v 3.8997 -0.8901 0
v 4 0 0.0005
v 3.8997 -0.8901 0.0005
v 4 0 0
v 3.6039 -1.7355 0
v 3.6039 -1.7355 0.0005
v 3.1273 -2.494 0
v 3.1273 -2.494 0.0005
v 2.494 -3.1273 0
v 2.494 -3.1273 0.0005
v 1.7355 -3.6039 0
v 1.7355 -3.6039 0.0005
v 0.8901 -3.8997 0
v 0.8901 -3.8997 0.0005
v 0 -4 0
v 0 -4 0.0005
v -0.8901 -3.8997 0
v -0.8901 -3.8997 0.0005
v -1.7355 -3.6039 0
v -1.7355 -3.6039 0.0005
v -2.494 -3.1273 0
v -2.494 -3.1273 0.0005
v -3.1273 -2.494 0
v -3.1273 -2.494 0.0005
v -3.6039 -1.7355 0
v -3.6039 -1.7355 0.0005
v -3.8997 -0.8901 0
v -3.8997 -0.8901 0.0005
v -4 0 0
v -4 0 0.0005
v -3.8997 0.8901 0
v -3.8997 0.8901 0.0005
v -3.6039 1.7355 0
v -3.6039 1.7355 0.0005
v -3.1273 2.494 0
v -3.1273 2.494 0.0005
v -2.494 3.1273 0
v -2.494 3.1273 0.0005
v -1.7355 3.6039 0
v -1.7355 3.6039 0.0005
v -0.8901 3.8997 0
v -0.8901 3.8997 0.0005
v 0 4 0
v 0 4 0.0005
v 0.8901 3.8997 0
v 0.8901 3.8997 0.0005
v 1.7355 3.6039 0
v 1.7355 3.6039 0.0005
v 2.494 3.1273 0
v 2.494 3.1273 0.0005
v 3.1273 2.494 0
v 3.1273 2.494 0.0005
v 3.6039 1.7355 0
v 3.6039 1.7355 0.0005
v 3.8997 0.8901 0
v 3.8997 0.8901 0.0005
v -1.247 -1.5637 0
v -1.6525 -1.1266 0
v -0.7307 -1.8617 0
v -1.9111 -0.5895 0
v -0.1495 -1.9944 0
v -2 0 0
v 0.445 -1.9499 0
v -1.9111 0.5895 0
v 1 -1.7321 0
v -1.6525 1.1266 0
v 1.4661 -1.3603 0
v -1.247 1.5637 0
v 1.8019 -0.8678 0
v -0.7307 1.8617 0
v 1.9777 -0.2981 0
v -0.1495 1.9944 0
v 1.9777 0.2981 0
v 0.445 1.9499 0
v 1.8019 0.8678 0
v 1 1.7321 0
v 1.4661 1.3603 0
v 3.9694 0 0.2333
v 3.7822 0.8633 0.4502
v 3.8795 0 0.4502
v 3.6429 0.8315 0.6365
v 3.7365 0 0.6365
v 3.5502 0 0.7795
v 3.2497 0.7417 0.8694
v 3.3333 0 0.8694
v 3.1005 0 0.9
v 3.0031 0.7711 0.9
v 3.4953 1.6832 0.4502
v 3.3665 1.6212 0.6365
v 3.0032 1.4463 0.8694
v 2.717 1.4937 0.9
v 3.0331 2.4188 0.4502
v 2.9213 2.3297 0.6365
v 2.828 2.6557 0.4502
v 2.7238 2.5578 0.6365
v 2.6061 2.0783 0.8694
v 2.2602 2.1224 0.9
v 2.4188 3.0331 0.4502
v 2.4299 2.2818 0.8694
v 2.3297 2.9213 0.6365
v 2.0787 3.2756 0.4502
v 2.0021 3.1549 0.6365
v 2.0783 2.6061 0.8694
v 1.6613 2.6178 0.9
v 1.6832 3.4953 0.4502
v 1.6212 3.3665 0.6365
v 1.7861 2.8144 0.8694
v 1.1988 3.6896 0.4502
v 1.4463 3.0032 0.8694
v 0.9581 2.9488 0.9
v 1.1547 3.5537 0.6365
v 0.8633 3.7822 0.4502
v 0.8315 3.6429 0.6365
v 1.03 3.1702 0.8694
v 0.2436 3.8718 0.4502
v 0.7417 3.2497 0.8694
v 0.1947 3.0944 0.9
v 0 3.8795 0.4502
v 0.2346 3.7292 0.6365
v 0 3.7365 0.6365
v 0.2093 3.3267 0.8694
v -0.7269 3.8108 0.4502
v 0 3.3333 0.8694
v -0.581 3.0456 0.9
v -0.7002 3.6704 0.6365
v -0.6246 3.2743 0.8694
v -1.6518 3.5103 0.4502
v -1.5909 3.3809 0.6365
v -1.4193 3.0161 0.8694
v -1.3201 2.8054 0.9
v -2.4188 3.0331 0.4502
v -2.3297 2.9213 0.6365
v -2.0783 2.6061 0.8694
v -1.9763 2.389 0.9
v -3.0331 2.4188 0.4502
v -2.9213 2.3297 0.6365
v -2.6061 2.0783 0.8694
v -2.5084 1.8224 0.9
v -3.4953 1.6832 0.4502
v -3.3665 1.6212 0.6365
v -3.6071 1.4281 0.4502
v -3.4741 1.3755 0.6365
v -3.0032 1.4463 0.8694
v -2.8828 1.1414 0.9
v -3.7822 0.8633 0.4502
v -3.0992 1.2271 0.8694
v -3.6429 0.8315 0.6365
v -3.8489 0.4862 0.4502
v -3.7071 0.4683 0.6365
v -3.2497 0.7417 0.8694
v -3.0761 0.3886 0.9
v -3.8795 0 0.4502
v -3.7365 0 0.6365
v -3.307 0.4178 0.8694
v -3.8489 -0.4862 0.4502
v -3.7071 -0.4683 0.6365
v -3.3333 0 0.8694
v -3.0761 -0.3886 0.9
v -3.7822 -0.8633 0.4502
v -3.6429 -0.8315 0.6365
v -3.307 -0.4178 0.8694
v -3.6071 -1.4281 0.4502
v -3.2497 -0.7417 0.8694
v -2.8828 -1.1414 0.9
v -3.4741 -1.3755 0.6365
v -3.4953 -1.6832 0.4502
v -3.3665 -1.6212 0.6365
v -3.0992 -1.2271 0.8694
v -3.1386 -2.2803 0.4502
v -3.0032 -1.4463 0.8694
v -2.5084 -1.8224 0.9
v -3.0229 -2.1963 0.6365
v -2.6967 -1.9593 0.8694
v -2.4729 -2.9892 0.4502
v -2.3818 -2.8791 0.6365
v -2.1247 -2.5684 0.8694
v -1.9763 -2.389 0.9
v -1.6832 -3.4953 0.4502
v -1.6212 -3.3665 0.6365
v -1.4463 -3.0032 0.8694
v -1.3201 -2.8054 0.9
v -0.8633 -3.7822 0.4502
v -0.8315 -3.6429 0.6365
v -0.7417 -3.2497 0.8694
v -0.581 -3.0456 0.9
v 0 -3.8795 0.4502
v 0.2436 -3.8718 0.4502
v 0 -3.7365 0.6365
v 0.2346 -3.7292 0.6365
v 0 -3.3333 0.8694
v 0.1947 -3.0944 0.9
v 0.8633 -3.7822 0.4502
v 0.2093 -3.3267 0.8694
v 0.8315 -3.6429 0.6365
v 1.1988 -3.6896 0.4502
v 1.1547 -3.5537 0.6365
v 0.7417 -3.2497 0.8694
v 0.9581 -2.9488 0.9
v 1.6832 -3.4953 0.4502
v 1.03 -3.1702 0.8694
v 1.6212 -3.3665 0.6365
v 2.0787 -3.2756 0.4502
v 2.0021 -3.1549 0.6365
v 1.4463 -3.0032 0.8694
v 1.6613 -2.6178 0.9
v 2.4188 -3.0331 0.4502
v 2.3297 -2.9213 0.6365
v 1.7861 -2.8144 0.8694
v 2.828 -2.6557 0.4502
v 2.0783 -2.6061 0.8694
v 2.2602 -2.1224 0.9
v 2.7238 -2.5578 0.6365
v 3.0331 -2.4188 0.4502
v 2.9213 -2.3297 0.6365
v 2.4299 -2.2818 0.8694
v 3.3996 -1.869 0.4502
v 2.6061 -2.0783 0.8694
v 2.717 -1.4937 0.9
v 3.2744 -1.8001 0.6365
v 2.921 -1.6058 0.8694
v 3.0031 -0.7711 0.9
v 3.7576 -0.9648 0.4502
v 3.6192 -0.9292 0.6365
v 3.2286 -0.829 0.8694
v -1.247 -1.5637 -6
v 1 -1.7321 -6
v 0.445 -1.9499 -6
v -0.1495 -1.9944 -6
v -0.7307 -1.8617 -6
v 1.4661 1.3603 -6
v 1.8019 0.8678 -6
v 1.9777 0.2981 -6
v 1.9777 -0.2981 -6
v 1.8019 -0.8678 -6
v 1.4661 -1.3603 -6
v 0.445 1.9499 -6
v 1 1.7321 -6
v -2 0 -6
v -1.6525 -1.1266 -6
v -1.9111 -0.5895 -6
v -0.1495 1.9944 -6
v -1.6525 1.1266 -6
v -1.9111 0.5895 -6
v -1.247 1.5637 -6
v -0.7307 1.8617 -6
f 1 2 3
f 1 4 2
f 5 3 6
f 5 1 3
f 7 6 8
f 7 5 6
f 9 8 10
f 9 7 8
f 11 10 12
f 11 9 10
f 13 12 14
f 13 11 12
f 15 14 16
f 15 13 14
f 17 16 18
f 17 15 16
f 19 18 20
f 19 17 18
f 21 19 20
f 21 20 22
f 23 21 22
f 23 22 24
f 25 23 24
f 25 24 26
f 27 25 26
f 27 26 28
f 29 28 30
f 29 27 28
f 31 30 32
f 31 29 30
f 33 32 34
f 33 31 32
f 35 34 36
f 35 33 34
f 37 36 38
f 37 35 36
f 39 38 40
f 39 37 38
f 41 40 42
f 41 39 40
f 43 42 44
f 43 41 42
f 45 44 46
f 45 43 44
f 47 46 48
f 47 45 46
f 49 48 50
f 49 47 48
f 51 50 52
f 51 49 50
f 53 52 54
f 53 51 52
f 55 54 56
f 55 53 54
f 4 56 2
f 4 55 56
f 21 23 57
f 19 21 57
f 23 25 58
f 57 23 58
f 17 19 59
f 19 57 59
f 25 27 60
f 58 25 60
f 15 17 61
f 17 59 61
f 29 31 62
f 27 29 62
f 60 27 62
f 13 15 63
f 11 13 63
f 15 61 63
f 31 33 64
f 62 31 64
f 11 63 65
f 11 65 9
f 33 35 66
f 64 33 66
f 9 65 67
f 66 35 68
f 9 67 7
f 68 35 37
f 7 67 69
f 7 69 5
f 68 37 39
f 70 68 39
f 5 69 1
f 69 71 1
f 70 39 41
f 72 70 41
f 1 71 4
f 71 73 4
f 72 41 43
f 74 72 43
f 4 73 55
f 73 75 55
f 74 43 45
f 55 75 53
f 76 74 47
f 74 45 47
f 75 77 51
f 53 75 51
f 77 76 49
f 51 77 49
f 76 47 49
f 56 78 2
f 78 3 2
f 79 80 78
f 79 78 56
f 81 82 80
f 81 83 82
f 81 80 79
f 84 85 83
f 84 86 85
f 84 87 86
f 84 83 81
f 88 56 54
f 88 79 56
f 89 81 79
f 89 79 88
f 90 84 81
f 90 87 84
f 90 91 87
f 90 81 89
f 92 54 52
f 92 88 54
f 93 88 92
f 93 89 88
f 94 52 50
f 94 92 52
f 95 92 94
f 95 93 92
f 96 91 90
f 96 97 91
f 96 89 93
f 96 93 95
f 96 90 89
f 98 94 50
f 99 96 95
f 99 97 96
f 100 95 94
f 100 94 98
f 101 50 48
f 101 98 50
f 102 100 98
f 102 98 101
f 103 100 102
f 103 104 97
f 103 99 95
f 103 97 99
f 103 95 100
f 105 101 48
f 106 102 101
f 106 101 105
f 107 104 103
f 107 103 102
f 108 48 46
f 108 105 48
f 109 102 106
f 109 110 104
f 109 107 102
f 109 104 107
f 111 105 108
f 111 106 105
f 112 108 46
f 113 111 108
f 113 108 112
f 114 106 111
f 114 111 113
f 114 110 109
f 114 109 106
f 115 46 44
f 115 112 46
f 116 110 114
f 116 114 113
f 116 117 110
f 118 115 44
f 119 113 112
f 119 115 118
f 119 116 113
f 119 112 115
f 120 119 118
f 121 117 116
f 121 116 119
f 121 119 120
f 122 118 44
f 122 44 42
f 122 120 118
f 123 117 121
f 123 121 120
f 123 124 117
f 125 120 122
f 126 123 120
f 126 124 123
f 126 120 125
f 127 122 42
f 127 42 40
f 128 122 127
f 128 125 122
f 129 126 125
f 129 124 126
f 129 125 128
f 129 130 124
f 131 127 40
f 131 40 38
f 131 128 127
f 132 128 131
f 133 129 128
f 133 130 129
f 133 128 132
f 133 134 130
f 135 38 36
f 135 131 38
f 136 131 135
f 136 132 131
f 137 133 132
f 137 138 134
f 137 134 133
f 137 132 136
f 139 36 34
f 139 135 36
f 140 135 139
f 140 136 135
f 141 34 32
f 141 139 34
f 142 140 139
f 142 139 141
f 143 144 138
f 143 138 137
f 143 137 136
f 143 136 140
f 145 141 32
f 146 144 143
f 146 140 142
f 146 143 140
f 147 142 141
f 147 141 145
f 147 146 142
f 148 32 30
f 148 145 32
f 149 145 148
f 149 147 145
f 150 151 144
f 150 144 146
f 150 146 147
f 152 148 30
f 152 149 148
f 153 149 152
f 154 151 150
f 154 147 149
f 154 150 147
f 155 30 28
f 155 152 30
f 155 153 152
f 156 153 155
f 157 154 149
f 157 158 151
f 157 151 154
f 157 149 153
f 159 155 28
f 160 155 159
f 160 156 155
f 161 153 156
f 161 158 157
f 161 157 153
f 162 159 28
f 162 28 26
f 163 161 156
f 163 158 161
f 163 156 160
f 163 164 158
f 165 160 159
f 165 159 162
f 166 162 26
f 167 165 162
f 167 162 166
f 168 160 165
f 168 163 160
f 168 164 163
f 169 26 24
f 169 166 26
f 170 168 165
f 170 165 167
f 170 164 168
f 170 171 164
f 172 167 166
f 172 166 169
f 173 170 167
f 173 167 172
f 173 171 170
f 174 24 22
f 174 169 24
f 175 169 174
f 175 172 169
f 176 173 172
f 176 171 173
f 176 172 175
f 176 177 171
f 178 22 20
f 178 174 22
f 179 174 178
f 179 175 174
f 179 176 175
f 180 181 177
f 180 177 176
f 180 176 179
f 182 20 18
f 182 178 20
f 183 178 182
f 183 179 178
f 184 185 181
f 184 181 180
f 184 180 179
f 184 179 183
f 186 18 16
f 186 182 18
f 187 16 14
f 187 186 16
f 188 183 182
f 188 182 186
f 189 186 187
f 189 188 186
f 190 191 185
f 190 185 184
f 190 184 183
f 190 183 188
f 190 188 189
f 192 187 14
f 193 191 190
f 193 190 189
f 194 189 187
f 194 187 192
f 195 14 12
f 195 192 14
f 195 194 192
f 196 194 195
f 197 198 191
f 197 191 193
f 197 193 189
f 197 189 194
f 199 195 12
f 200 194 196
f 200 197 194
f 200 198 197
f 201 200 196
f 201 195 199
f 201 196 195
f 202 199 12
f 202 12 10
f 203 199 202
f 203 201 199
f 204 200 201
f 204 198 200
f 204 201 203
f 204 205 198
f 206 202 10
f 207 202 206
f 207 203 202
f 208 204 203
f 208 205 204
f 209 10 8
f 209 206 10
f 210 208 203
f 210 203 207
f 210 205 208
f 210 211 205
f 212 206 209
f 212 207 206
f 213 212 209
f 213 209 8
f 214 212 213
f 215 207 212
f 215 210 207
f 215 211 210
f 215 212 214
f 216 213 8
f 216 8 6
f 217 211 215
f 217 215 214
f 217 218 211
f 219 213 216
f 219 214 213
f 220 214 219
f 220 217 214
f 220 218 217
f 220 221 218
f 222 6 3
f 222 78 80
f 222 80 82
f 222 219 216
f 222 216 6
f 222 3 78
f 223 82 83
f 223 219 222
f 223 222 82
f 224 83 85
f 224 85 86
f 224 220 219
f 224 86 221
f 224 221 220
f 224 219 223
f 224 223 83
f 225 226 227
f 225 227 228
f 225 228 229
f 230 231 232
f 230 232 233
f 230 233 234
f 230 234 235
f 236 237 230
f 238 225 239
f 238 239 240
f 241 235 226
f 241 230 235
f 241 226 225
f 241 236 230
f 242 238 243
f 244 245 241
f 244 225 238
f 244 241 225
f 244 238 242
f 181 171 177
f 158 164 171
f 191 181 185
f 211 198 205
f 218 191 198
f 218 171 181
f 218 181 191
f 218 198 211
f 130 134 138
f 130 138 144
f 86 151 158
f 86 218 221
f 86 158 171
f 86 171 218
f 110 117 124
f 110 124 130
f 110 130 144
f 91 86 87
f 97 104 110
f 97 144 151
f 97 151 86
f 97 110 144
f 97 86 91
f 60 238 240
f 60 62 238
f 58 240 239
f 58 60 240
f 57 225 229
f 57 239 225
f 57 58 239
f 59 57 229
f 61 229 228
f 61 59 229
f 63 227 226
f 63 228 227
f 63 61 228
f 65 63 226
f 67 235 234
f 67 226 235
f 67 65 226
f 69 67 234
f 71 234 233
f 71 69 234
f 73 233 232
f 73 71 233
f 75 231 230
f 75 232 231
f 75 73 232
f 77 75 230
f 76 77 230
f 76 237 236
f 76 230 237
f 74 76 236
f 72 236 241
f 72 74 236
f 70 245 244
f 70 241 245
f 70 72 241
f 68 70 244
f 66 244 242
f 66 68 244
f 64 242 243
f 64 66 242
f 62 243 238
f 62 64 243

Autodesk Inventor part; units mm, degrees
ref_plane "YZ Plane" through (0, 0, 0) normal (1, 0, 0) x (0, 1, 0)
ref_plane "XZ Plane" through (0, 0, 0) normal (0, 1, 0) x (-1, 0, 0)
ref_plane "XY Plane" through (0, 0, 0) normal (0, 0, 1) x (1, 0, 0)
sketch "スケッチ1" plane through (0, 0, 0) normal (0, 0, 1) x (1, 0, 0)
  circle A0 centre (0, 0) radius 4
  dimension "d0" = 8
extrude "押し出し1" add sketch "スケッチ1" along normal blind 0.9
sketch "スケッチ2" plane through (0, 0, 0) normal (0, 0, -1) x (-1, 0, 0)
  circle A0 centre (0, 0) radius 2
  dimension "d3" = 4
extrude "押し出し2" add sketch "スケッチ2" along normal blind 6
thread "ねじ1" size "M4x0.7" class "6g" standard "ANSI Metric M Profile" full length
fillet "フィレット1" radius 0.9 1 edges at (-4, 0, 0.9)
properties part number "ネジ低頭m4.06" material "鋼 AISI 4340 242 HR"
